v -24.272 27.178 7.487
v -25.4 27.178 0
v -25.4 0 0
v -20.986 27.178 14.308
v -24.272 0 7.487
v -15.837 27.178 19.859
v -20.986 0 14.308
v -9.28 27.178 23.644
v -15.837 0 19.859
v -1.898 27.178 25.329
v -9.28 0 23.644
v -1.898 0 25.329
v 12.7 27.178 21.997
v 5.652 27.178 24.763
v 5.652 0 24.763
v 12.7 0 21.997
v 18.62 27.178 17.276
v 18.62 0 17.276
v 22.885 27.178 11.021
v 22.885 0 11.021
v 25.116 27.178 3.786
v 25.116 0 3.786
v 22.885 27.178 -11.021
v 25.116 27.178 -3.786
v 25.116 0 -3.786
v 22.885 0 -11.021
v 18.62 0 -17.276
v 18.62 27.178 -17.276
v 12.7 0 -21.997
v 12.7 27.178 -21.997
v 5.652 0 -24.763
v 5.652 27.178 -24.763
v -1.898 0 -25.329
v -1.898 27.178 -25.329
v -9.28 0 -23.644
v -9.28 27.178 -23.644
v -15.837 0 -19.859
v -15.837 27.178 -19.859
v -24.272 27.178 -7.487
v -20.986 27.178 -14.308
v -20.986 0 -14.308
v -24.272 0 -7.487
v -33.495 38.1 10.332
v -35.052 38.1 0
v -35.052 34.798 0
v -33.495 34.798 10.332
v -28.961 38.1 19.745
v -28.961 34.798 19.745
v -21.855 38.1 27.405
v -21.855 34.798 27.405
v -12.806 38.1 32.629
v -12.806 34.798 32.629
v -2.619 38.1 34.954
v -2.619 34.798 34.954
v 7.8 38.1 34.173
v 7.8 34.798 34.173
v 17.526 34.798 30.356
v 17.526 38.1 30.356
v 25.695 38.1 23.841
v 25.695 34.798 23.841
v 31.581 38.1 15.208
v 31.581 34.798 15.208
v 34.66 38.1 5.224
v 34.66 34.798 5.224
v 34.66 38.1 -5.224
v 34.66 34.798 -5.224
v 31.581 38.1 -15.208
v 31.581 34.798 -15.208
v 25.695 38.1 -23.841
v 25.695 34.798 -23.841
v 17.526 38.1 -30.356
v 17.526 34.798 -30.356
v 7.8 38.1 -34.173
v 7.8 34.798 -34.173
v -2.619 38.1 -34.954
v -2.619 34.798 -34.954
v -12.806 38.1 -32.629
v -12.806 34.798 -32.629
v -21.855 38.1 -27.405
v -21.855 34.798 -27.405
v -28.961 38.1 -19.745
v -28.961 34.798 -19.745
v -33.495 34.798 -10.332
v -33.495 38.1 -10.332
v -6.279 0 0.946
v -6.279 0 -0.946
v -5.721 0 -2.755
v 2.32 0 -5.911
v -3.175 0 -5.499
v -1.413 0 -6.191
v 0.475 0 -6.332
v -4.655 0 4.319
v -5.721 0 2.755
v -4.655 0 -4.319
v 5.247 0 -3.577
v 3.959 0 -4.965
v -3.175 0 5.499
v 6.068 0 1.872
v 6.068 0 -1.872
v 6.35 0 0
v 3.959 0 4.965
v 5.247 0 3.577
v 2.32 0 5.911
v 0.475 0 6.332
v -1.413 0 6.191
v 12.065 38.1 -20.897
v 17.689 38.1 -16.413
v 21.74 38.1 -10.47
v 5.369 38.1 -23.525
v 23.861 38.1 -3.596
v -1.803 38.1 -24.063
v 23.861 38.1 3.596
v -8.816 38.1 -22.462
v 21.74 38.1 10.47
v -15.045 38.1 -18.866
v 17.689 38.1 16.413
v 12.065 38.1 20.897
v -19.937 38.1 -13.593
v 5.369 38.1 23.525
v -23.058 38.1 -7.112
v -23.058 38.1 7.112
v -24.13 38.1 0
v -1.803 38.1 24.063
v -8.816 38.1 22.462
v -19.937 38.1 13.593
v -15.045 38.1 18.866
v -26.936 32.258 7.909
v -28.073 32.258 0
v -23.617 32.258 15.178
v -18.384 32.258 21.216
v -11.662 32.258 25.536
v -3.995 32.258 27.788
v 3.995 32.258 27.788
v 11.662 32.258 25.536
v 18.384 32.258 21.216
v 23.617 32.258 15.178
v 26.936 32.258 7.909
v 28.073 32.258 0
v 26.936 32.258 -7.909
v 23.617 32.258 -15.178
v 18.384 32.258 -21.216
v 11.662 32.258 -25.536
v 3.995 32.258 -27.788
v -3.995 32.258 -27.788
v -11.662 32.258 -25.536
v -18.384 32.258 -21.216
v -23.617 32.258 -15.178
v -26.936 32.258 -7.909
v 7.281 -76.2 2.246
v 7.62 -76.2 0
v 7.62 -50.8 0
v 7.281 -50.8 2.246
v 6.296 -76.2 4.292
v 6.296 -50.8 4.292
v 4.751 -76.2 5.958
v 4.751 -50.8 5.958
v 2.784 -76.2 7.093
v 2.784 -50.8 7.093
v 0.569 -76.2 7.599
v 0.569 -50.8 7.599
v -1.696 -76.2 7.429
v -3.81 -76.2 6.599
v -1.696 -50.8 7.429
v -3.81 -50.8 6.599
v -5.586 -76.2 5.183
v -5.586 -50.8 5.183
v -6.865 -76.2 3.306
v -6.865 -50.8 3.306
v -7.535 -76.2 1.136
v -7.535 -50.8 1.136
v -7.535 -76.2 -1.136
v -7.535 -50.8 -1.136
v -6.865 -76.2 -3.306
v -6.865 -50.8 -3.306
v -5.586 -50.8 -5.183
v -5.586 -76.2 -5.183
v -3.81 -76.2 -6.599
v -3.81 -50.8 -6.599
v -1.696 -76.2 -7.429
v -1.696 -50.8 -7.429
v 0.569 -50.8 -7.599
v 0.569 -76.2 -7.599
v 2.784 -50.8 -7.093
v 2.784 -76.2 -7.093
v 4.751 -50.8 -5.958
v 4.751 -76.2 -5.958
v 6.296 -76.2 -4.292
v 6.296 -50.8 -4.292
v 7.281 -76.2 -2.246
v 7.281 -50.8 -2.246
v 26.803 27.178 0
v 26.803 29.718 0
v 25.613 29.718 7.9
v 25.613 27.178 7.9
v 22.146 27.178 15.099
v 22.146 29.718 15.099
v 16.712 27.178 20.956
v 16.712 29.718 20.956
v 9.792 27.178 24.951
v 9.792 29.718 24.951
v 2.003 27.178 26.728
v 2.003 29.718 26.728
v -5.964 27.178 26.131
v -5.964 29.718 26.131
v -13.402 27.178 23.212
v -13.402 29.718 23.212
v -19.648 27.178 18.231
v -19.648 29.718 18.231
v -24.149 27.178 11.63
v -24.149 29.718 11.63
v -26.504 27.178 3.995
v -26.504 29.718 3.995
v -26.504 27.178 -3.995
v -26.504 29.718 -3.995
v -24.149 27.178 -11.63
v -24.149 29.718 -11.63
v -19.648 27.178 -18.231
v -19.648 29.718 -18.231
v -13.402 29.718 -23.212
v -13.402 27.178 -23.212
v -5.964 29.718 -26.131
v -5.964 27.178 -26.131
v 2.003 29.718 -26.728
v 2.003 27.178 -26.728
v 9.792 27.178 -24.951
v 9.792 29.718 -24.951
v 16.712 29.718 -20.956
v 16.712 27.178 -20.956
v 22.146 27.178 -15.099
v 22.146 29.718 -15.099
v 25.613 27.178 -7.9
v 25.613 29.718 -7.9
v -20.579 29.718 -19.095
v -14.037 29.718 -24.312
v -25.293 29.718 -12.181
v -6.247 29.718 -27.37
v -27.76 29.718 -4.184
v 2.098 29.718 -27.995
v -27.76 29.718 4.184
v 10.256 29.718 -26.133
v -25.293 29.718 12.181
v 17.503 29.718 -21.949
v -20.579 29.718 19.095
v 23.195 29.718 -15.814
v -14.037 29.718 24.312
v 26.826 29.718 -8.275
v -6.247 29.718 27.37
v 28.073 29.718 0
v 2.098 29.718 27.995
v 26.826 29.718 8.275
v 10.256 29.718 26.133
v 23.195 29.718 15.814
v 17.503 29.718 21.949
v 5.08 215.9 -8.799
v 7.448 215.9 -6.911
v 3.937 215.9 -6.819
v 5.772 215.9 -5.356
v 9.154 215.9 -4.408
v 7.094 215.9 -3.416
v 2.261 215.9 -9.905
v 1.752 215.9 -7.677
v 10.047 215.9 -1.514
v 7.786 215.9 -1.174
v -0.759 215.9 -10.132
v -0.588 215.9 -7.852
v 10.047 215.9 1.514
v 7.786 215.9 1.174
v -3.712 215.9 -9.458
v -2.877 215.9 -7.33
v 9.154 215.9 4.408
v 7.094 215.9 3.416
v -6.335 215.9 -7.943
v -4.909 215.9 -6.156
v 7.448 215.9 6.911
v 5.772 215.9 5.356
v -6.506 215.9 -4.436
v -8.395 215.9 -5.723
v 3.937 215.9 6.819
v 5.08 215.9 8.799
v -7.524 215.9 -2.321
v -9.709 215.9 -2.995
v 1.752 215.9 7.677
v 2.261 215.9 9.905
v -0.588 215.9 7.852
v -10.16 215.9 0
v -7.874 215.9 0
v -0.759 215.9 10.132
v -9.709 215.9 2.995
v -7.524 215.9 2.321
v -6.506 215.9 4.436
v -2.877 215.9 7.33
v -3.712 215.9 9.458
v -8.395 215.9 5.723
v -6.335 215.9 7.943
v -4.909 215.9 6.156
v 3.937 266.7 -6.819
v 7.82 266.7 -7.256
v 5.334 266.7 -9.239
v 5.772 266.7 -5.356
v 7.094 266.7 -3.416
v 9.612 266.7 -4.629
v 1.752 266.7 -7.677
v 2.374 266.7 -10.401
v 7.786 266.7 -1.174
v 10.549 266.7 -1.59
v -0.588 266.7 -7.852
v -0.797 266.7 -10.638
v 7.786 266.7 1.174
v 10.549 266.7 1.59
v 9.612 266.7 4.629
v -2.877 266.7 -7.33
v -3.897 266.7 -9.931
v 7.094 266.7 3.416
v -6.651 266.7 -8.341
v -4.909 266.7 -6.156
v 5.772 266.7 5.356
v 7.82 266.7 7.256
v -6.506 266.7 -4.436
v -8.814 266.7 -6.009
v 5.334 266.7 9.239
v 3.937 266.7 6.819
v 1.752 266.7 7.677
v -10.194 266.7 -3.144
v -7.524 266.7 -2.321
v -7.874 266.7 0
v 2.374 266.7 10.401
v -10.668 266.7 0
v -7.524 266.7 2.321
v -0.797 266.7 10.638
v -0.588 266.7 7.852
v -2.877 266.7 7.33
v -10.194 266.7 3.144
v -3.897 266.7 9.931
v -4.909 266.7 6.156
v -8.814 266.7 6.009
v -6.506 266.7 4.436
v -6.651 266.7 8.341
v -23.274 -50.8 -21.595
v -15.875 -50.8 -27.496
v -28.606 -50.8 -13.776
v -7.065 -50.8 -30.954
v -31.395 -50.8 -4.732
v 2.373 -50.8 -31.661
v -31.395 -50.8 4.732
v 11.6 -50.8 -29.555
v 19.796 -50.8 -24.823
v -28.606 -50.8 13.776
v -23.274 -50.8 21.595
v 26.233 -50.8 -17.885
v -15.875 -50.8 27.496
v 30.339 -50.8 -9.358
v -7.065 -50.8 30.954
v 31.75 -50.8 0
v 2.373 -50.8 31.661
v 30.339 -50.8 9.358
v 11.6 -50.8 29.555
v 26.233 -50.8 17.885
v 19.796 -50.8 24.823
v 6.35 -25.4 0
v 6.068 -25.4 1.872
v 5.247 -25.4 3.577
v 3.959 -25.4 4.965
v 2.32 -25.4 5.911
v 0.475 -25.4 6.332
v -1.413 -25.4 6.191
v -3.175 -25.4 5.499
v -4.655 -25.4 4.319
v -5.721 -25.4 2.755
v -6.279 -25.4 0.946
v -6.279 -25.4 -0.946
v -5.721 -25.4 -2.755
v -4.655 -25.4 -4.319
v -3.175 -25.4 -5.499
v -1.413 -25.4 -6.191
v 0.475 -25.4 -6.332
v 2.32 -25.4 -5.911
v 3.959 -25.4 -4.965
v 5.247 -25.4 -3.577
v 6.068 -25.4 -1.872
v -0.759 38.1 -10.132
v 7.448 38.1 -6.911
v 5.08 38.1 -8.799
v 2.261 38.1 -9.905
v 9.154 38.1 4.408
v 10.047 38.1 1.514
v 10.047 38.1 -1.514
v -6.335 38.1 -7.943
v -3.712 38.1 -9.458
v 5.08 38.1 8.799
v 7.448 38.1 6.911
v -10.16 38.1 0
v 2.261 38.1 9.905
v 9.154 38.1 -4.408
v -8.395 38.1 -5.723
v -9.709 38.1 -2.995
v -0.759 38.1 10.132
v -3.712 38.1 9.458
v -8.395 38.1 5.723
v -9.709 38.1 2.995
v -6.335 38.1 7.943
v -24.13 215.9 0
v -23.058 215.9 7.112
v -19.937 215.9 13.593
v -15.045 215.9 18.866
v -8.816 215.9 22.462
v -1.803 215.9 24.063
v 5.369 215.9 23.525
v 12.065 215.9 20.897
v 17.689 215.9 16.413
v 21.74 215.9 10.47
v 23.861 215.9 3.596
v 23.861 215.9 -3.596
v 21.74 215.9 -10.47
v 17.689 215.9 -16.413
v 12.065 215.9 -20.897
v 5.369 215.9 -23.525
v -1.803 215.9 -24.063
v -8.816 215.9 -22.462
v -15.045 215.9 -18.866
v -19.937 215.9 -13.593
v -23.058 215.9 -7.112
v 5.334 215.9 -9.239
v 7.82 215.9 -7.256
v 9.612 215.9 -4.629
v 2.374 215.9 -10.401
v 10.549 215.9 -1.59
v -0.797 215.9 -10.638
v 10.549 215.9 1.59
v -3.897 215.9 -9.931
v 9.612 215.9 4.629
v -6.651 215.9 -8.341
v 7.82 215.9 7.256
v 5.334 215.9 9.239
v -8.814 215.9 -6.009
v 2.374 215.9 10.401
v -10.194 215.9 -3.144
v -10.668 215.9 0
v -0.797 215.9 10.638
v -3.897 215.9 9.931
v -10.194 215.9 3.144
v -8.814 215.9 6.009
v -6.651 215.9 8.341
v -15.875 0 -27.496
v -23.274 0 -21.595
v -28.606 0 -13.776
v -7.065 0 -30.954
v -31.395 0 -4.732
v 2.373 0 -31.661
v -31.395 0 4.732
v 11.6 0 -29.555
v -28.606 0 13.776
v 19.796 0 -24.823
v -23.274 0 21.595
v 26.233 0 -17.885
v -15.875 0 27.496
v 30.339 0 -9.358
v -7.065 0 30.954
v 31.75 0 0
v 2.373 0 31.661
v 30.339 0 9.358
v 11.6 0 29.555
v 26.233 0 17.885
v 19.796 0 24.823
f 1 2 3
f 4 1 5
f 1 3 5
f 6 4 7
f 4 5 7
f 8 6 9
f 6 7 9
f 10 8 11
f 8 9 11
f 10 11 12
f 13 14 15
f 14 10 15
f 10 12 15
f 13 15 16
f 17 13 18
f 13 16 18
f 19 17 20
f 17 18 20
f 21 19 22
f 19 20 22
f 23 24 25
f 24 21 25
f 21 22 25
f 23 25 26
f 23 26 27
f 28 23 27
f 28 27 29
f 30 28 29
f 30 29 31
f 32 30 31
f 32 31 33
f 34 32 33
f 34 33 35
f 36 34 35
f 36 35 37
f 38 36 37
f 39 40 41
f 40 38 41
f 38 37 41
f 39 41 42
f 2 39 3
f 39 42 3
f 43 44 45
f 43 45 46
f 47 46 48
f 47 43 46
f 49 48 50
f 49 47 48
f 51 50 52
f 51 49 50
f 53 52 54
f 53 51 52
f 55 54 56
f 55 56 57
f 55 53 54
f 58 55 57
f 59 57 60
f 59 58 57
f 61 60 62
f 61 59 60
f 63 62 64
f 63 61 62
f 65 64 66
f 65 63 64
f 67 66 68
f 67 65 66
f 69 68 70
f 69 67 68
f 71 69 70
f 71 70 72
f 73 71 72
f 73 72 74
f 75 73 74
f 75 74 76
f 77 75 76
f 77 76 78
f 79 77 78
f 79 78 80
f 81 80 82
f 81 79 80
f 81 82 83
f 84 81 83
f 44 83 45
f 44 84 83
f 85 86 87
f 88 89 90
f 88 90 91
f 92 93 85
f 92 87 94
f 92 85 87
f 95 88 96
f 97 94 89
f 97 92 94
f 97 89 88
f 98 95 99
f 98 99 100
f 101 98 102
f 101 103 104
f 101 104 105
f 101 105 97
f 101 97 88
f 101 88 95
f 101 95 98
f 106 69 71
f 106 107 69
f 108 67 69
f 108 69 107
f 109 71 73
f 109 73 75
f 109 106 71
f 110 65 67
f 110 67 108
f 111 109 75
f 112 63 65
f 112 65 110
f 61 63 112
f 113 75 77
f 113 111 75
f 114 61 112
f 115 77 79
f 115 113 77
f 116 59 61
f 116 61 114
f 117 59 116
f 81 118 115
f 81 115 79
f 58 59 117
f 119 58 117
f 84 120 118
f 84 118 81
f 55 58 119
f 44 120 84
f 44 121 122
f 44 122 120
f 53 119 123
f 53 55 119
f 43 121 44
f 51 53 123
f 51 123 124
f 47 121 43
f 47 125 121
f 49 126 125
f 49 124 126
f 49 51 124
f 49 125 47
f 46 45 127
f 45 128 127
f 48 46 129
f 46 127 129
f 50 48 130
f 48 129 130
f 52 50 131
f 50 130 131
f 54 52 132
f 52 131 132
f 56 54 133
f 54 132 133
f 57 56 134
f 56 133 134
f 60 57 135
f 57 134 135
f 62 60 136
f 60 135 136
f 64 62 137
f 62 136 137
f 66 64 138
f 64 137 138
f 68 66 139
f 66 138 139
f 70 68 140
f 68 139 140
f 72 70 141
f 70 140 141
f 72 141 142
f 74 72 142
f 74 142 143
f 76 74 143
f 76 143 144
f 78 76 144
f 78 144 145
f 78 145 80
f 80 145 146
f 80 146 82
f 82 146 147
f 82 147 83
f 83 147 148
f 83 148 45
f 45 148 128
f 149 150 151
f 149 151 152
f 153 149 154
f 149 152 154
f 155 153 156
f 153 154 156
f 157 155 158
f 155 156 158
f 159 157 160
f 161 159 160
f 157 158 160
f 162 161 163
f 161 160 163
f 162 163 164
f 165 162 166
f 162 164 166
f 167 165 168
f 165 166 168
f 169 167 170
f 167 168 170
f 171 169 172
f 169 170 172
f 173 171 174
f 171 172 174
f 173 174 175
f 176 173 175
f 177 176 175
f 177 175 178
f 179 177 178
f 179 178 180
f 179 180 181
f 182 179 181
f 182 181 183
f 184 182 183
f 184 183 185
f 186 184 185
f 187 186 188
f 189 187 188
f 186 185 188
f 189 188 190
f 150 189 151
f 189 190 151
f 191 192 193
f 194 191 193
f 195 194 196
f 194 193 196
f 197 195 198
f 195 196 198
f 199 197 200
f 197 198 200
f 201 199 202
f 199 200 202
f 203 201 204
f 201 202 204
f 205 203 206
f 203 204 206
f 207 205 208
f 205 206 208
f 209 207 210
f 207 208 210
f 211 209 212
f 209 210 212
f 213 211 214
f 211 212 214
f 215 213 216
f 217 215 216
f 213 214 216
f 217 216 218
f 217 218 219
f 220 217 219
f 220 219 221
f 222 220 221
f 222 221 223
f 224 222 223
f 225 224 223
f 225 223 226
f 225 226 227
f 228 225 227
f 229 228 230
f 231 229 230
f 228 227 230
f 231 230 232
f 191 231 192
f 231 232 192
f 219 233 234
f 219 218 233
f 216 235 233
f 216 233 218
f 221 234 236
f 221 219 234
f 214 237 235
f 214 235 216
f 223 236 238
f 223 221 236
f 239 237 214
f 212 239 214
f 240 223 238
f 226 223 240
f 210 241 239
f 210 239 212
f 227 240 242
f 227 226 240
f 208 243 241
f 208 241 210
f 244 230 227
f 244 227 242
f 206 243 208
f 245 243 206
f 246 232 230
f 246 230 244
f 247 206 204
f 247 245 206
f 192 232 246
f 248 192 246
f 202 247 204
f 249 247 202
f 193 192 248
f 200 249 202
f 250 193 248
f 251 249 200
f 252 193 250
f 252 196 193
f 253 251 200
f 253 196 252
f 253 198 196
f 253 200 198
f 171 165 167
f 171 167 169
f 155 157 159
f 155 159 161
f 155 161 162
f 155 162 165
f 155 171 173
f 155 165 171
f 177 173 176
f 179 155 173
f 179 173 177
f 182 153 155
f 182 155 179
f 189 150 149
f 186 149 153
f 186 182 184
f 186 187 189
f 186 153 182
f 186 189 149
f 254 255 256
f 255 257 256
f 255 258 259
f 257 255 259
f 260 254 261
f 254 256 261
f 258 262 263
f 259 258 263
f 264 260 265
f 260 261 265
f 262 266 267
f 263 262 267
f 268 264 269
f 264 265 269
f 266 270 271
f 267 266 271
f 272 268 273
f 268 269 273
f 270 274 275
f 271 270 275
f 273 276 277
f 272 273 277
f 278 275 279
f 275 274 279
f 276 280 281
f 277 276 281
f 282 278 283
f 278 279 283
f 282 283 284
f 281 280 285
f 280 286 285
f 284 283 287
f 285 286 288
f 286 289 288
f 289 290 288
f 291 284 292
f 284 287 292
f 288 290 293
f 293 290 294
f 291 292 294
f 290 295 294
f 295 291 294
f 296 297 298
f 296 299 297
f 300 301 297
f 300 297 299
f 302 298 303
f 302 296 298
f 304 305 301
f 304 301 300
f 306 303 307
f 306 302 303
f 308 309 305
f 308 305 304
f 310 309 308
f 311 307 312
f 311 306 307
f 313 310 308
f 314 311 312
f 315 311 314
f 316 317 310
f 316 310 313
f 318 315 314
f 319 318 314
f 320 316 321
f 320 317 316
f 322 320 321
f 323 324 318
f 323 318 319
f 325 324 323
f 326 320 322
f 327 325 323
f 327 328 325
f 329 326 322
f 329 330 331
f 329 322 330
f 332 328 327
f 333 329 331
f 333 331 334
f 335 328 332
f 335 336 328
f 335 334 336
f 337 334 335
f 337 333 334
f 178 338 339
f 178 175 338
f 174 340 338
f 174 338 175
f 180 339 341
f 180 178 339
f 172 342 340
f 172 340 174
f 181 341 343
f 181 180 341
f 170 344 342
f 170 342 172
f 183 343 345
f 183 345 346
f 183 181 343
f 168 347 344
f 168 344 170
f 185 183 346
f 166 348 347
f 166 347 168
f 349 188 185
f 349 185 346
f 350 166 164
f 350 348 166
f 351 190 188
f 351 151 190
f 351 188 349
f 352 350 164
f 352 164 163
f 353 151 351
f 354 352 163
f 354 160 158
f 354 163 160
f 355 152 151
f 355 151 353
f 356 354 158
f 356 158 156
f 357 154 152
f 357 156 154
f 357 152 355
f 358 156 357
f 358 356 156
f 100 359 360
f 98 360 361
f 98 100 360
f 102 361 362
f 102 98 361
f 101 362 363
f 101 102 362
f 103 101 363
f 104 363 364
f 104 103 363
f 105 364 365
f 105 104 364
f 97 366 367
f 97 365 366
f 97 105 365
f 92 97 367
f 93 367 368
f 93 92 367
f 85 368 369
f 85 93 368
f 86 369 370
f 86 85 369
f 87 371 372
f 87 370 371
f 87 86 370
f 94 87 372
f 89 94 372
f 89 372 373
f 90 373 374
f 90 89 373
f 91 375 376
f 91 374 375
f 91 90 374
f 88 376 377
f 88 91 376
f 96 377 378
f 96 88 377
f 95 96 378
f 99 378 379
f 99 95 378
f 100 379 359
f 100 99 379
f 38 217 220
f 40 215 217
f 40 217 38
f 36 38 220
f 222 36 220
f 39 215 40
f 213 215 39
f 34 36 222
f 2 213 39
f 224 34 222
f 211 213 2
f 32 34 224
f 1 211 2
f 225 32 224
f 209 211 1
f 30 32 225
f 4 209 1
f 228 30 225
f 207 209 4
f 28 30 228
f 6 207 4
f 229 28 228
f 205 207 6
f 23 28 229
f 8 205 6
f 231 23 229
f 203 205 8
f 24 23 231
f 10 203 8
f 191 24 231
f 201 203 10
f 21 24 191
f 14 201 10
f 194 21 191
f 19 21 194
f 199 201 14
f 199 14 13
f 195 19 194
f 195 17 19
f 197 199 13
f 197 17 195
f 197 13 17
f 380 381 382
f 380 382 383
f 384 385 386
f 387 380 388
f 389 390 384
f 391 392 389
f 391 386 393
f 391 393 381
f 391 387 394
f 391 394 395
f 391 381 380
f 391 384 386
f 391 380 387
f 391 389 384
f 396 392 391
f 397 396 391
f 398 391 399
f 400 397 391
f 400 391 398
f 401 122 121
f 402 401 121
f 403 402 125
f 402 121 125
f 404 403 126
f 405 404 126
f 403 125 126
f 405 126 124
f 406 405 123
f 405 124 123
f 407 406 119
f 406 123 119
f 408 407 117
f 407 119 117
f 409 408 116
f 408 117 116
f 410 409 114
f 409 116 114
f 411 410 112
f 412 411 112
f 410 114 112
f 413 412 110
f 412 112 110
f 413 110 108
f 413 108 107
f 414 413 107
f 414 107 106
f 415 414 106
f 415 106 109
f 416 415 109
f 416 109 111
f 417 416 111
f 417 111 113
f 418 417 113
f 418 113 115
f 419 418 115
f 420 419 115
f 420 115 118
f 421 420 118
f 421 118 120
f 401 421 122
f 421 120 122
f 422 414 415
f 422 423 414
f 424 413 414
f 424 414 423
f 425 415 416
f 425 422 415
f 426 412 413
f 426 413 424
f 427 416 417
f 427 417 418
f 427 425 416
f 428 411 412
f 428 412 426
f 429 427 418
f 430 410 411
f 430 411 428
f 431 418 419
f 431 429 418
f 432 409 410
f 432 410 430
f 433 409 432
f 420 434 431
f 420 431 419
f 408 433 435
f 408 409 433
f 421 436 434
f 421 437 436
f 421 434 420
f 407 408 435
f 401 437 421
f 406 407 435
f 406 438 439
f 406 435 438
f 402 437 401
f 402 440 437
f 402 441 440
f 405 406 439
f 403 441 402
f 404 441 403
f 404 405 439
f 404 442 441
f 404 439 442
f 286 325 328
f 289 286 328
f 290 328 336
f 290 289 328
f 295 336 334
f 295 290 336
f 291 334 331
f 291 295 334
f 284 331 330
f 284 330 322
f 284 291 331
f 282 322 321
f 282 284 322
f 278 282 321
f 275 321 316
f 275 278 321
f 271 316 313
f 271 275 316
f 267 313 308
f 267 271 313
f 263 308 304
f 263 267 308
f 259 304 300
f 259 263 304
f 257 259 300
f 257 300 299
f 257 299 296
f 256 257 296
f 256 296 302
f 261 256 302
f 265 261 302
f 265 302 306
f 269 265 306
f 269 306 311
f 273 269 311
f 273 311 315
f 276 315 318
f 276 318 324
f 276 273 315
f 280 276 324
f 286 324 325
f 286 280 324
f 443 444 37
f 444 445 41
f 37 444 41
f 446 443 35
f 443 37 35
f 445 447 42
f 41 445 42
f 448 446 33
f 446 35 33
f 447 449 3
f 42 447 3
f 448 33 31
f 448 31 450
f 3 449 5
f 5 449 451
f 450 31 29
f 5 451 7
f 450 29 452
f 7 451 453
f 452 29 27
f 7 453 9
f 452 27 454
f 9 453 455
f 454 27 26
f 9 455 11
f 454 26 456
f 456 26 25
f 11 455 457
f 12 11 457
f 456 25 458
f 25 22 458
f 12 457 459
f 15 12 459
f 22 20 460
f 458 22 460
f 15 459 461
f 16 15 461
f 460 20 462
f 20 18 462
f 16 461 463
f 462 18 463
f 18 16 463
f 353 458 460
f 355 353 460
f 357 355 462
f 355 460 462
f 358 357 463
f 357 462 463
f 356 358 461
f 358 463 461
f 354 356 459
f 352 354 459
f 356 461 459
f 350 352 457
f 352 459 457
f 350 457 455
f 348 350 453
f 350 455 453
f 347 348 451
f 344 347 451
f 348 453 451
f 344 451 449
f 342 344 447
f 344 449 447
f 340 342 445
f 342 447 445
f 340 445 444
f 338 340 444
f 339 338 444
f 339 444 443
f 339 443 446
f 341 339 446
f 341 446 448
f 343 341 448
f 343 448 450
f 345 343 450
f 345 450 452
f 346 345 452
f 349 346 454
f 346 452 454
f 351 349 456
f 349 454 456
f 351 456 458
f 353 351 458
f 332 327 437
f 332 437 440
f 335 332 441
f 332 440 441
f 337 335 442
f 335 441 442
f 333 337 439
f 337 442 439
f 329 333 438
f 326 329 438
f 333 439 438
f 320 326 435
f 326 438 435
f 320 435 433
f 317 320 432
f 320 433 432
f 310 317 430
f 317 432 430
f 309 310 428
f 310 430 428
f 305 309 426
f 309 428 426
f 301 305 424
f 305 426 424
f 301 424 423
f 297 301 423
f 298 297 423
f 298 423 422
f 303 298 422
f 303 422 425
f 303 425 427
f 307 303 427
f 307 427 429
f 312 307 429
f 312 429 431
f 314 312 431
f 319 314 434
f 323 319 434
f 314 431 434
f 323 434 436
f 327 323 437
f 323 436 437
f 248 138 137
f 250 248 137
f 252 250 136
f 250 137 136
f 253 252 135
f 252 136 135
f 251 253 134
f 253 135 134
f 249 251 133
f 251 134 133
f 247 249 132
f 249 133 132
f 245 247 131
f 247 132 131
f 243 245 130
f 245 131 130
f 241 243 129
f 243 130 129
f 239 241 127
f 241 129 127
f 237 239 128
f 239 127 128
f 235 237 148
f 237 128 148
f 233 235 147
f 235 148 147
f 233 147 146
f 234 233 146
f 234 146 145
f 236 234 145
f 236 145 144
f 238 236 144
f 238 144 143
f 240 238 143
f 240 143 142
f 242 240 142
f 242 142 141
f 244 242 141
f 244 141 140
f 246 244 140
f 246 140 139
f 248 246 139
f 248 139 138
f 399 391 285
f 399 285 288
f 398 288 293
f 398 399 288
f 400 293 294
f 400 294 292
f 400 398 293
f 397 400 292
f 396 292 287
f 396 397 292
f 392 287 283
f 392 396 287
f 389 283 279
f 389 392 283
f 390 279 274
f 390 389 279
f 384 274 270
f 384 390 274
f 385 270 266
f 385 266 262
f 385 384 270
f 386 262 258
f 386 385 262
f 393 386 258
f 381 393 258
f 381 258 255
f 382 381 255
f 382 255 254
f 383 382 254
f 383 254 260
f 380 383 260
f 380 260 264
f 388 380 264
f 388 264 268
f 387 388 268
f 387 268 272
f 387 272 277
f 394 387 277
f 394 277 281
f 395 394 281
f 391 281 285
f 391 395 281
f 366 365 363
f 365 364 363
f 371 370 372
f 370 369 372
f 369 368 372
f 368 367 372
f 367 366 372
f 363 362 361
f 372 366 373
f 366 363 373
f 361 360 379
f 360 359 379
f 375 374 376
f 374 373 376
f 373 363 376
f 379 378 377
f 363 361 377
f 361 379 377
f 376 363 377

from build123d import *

# Parameters (mm, degrees)
F1_R      = 6.35
F2_DEPTH  = 5.842
F3_R      = 6.35
F4_DEPTH  = 2.54
F5_R      = 31.75
F5_R_2    = 6.35
F6_DEPTH  = 50.8
F7_R      = 7.62
F7_R_2    = 6.35
F8_DEPTH  = 25.4
F9_R      = 6.35
F12_R     = 25.4
F13_DEPTH = 38.1
F14_R     = 35.052
F14_R_2   = 22.86
F15_DEPTH = 5.842
F16_SIZE2 = 6.9785926454
F16_SIZE  = 2.54
F17_R     = 28.0734073546
F17_R_2   = 24.13
F18_DEPTH = 2.54
F19_R     = 26.8034073546
F19_R_2   = 24.13
F20_DEPTH = 2.54
F21_R     = 24.1300254
F21_R_2   = 10.16
F22_DEPTH = 177.8
F23_R     = 10.668
F23_R_2   = 7.874
F24_DEPTH = 50.8


with BuildPart() as f2:
    # F1 (on Front) → F2 (new body)
    with BuildSketch(Plane.XZ):
        Circle(F1_R)
    extrude(amount=-F2_DEPTH)

    # F3 (on face) → F4 (join)
    with BuildSketch(Plane(origin=(0, 5.842, 0), x_dir=(-1, 0, 0), z_dir=(0, 1, 0))):
        Circle(F3_R)
    extrude(amount=F4_DEPTH)

    # F5 (on face) → F6 (join)
    with BuildSketch(Plane.XZ):
        Circle(F5_R)
        Circle(F5_R_2, mode=Mode.SUBTRACT)
    extrude(amount=F6_DEPTH)

    # F7 (on face) → F8 (join)
    with BuildSketch(Plane.XZ.offset(50.8)):
        Circle(F7_R)
        Circle(F7_R_2, mode=Mode.SUBTRACT)
    extrude(amount=F8_DEPTH)

    # F11: sweep along a path in F10
    with BuildLine(Plane.YZ) as f11_path:
        Line((-76.2, 0), (-25.4, 0))
    # F9 (on face) → F11 (sweep)
    with BuildSketch(Plane.XZ.offset(76.2)):
        Circle(F9_R)
    sweep(path=f11_path.line)

    # F12 (on face) → F13 (join)
    with BuildSketch(Plane(origin=(0, 0, 0), x_dir=(-1, 0, 0), z_dir=(0, 1, 0))):
        Circle(F12_R)
    extrude(amount=F13_DEPTH)

    # F14 (on face) → F15 (join)
    with BuildSketch(Plane(origin=(0, 38.1, 0), x_dir=(-1, 0, 0), z_dir=(0, 1, 0))):
        Circle(F14_R)
        Circle(F14_R_2, mode=Mode.SUBTRACT)
    extrude(amount=-F15_DEPTH)

    # F16
    f16_edges = [f2.edges().sort_by_distance(p)[0] for p in [
        (35.052, 32.258, 0),
    ]]
    f16_side = f2.faces().sort_by_distance((35.052, 35.179, 0))[0]
    chamfer(f16_edges, length=F16_SIZE, length2=F16_SIZE2, reference=f16_side)

    # F17 (on face) → F18 (join)
    with BuildSketch(Plane.XZ.offset(-32.258)):
        Circle(F17_R)
        Circle(F17_R_2, mode=Mode.SUBTRACT)
    extrude(amount=F18_DEPTH)

    # F19 (on face) → F20 (join)
    with BuildSketch(Plane.XZ.offset(-29.718)):
        Circle(F19_R)
        Circle(F19_R_2, mode=Mode.SUBTRACT)
    extrude(amount=F20_DEPTH)

    # F21 (on face) → F22 (join)
    with BuildSketch(Plane(origin=(0, 38.1, 0), x_dir=(-1, 0, 0), z_dir=(0, 1, 0))):
        Circle(F21_R)
        Circle(F21_R_2, mode=Mode.SUBTRACT)
    extrude(amount=F22_DEPTH)

    # F23 (on face) → F24 (join)
    with BuildSketch(Plane(origin=(0, 215.9, 0), x_dir=(-1, 0, 0), z_dir=(0, 1, 0))):
        Circle(F23_R)
        Circle(F23_R_2, mode=Mode.SUBTRACT)
    extrude(amount=F24_DEPTH)


solid = f2.part
